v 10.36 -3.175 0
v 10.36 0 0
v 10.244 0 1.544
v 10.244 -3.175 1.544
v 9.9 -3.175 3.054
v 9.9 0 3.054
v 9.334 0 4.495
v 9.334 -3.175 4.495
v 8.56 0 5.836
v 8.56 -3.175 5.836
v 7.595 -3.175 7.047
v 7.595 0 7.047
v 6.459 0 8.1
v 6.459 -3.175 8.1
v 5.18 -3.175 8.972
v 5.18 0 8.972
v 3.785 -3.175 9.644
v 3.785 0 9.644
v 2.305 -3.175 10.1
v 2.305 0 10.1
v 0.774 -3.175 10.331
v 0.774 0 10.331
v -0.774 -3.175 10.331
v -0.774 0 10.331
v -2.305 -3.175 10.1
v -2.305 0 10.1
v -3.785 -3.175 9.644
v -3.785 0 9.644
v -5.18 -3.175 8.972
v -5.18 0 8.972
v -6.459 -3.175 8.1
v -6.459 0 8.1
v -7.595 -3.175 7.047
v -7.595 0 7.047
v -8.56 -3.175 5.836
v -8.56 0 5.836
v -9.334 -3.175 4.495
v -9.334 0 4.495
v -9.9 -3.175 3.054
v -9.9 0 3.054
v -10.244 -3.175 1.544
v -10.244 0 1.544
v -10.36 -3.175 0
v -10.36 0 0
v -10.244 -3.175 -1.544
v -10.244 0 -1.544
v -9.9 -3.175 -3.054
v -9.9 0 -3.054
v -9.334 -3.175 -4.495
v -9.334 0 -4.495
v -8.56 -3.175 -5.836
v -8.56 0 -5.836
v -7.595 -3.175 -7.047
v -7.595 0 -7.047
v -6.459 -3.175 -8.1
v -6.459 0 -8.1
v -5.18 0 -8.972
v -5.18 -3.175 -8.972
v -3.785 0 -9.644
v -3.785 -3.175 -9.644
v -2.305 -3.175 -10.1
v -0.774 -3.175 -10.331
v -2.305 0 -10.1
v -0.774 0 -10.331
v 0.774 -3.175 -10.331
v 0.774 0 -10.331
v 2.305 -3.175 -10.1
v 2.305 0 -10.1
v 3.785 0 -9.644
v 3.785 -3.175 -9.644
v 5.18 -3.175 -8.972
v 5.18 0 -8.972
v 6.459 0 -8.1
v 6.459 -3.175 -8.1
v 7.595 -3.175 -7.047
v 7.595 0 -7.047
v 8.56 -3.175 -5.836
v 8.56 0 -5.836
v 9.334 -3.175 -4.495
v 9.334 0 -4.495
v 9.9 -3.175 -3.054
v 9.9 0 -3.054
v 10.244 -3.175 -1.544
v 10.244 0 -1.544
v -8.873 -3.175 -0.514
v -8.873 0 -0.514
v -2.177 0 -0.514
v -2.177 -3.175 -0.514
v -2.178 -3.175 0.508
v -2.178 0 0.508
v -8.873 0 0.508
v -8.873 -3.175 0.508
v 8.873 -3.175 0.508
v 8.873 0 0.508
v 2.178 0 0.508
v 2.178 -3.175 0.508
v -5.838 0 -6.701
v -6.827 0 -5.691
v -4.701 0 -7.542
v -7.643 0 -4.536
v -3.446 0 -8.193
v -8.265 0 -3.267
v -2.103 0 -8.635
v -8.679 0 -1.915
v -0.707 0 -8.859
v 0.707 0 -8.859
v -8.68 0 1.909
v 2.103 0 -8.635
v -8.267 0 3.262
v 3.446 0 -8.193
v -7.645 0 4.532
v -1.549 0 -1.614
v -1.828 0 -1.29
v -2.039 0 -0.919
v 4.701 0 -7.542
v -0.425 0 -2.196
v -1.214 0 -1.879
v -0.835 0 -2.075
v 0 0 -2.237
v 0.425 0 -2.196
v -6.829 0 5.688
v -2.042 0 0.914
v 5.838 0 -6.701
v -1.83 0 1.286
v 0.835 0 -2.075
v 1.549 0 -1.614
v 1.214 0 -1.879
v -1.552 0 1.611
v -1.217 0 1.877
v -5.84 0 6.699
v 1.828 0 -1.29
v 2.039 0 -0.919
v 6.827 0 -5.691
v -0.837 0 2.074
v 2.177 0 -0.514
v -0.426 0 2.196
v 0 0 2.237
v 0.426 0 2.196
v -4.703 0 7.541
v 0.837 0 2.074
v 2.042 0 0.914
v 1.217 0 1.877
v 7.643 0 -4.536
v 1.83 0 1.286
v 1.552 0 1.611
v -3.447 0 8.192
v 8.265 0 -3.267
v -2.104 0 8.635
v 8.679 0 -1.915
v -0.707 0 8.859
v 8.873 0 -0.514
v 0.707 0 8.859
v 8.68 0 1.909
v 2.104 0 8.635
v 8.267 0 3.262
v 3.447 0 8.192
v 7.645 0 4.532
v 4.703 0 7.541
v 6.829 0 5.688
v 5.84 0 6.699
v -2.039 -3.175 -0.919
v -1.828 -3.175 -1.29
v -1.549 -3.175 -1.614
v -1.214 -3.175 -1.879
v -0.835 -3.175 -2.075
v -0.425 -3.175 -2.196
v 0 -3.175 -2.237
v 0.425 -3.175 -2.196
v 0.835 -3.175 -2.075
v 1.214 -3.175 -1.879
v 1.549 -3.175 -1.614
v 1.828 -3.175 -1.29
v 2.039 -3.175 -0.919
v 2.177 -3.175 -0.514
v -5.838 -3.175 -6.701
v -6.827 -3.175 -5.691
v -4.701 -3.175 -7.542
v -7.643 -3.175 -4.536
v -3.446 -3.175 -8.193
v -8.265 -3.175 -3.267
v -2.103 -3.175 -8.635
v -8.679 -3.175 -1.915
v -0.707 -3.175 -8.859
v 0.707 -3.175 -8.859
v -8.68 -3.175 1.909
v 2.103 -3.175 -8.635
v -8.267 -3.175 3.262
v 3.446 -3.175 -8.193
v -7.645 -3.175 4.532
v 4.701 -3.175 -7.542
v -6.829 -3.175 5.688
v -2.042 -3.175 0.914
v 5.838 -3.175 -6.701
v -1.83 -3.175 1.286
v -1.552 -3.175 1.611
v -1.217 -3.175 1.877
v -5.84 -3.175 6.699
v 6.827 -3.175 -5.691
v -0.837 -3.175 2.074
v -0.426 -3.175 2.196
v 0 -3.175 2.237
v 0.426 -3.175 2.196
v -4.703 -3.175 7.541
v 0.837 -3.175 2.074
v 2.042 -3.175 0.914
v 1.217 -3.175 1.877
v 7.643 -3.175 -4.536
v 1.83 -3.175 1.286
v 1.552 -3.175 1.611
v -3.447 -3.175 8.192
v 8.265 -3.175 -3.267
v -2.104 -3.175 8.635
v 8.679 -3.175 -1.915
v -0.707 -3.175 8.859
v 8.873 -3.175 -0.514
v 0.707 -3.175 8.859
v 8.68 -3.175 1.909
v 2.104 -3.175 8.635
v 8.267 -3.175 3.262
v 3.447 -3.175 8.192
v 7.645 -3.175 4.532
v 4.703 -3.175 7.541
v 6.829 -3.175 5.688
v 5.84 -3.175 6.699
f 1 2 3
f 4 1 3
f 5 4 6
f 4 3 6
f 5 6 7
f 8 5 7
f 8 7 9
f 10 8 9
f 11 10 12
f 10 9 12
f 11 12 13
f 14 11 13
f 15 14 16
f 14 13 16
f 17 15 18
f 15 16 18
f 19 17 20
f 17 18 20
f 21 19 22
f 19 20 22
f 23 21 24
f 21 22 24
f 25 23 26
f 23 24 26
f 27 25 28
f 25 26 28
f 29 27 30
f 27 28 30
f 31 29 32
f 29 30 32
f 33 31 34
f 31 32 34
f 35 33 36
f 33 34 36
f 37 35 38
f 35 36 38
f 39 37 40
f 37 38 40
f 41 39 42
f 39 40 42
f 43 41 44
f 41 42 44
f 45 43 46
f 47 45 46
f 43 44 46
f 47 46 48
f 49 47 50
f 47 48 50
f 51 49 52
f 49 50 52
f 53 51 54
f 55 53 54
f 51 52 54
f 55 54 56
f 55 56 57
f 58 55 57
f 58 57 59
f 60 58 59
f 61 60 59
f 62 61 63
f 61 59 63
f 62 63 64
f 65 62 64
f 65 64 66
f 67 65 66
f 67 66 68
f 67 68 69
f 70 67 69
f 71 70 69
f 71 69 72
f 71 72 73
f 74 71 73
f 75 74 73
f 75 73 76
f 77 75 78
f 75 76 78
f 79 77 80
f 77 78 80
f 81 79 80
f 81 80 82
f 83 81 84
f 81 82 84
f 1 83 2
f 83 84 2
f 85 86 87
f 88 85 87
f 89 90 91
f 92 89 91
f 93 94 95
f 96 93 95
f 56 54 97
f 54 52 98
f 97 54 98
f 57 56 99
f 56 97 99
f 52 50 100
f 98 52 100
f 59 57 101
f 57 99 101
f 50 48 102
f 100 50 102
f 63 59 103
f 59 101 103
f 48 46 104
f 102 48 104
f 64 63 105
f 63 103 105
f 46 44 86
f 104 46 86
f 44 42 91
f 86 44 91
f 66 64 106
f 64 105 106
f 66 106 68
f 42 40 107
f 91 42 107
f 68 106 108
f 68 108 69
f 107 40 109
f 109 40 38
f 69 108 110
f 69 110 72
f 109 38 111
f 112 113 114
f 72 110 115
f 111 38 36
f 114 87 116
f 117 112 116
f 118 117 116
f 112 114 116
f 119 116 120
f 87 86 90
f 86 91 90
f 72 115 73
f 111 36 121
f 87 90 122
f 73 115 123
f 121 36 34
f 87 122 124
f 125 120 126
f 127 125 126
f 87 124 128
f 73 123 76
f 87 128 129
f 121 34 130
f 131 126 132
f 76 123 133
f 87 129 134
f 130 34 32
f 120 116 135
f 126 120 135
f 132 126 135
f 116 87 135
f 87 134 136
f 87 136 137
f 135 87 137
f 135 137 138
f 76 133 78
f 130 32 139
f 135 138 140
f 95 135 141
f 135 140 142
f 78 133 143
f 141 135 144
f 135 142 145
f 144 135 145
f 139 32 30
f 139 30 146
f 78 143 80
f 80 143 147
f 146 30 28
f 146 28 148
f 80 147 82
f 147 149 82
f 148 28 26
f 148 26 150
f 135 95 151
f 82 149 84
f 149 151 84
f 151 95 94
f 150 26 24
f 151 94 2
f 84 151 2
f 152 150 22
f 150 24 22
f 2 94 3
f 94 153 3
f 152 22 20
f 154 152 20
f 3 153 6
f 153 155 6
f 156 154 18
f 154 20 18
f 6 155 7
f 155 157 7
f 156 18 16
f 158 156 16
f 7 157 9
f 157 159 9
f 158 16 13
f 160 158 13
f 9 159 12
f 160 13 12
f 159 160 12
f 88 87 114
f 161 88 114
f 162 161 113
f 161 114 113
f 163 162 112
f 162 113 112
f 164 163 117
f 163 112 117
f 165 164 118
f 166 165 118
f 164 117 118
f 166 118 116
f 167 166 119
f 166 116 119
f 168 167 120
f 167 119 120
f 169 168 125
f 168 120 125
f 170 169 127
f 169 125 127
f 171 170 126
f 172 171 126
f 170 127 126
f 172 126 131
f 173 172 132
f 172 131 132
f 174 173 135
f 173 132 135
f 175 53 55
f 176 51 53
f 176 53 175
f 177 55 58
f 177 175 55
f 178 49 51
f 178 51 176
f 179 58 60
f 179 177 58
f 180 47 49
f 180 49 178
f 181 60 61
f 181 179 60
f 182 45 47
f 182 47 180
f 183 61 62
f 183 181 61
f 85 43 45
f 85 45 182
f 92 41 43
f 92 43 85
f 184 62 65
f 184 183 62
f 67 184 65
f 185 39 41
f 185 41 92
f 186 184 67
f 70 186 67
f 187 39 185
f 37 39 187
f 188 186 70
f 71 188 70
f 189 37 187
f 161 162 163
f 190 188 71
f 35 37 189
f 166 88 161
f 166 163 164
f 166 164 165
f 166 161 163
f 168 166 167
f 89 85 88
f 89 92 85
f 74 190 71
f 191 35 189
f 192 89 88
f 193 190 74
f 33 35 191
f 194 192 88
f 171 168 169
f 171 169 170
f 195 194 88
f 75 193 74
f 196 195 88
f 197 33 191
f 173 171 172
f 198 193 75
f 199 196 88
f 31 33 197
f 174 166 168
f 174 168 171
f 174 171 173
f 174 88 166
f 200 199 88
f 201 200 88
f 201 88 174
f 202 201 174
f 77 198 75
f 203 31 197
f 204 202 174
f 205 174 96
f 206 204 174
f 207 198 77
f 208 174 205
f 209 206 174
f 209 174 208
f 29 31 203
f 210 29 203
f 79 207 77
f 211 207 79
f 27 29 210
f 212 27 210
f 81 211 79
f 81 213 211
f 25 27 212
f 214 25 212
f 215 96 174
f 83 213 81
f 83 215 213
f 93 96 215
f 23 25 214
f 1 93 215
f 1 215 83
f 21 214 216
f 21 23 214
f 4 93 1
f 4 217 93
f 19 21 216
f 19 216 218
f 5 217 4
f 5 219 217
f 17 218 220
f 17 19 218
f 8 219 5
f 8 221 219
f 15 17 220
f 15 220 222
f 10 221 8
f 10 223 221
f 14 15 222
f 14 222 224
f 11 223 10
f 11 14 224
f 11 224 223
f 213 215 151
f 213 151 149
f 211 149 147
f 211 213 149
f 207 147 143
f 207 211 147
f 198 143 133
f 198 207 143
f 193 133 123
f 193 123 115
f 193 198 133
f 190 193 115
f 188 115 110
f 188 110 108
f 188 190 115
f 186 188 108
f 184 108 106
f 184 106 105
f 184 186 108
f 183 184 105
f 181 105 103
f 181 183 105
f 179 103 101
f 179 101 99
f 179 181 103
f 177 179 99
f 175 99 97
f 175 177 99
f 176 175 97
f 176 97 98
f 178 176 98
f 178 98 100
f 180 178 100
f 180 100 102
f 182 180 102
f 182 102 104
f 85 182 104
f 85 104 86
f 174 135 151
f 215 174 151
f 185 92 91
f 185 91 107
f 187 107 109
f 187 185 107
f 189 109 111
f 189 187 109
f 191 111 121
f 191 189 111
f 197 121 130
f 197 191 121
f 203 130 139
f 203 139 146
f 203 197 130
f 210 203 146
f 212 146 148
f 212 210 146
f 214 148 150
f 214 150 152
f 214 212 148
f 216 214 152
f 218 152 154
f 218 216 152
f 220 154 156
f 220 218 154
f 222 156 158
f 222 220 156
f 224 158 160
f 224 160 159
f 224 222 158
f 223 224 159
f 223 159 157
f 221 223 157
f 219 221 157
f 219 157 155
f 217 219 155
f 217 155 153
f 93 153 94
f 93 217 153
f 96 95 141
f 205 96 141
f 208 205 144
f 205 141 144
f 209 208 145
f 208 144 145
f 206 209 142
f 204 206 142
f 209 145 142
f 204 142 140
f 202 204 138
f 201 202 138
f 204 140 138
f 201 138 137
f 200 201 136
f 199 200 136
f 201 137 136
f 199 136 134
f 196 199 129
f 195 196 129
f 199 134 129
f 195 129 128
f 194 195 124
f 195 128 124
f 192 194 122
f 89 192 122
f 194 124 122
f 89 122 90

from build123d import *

# Parameters (mm, degrees)
F0_R     = 10.3601879012
F1_DEPTH = 3.175
F2_R     = 10.3601879012
F3_DEPTH = 3.175


with BuildPart() as f1:
    # F0 (on Front) → F1 (new body)
    with BuildSketch(Plane.XZ):
        Circle(F0_R)
        with BuildLine():
            ThreePointArc((9.5114533333, 0.5078193457), (9.521612731, 0.254), (9.525, 0))
            ThreePointArc((9.525, 0), (9.5215246826, -0.2572794566), (9.5111012664, -0.5143711699))
            ThreePointArc((9.5111012664, -0.5143711699), (0, -9.525), (-9.5111012664, -0.5143711699))
            ThreePointArc((-9.5111012664, -0.5143711699), (-9.524999435, -0.0032806383), (-9.5114533333, 0.5078193457))
            ThreePointArc((-9.5114533333, 0.5078193457), (0, 9.525), (9.5114533333, 0.5078193457))
        make_face(mode=Mode.SUBTRACT)
        with BuildLine():
            Line((-2.1784585047, 0.5078193457), (-9.5114533333, 0.5078193457))
            ThreePointArc((-9.5114533333, 0.5078193457), (-9.524999435, -0.0032806383), (-9.5111012664, -0.5143711699))
            Line((-9.5111012664, -0.5143711699), (-2.1769208171, -0.5143711699))
            ThreePointArc((-2.1769208171, -0.5143711699), (-2.2368617797, -0.0033649251), (-2.1784585047, 0.5078193457))
        make_face()
        with BuildLine():
            ThreePointArc((2.2368643107, 0), (2.222214889, 0.2555835118), (2.1784585047, 0.5078193457))
            ThreePointArc((2.1784585047, 0.5078193457), (0, 2.2368643107), (-2.1784585047, 0.5078193457))
            ThreePointArc((-2.1784585047, 0.5078193457), (-2.2368617797, -0.0033649251), (-2.1769208171, -0.5143711699))
            ThreePointArc((-2.1769208171, -0.5143711699), (0, -2.2368643107), (2.1769208171, -0.5143711699))
            ThreePointArc((2.1769208171, -0.5143711699), (2.2218278992, -0.2589261105), (2.2368643107, 0))
        make_face()
        with BuildLine():
            ThreePointArc((9.5111012664, -0.5143711699), (9.5215246826, -0.2572794566), (9.525, 0))
            ThreePointArc((9.525, 0), (9.521612731, 0.254), (9.5114533333, 0.5078193457))
            Line((9.5114533333, 0.5078193457), (2.1784585047, 0.5078193457))
            ThreePointArc((2.1784585047, 0.5078193457), (2.222214889, 0.2555835118), (2.2368643107, 0))
            ThreePointArc((2.2368643107, 0), (2.2218278992, -0.2589261105), (2.1769208171, -0.5143711699))
            Line((2.1769208171, -0.5143711699), (9.5111012664, -0.5143711699))
        make_face()
    extrude(amount=F1_DEPTH)

    # F2 (on face) → F3 (join)
    with BuildSketch(Plane.XZ.offset(3.175)):
        Circle(F2_R)
        with BuildLine():
            ThreePointArc((8.8731253784, 0.5078193457), (8.8840143878, 0.2540134389), (8.8876450463, 0))
            ThreePointArc((8.8876450463, 0), (8.8839199998, -0.2572934234), (8.872747983, -0.5143711699))
            Line((8.872747983, -0.5143711699), (9.5111012664, -0.5143711699))
            ThreePointArc((9.5111012664, -0.5143711699), (0, -9.525), (-9.5111012664, -0.5143711699))
            Line((-9.5111012664, -0.5143711699), (-8.872747983, -0.5143711699))
            ThreePointArc((-8.872747983, -0.5143711699), (-8.8876444406, -0.0032813423), (-8.8731253784, 0.5078193457))
            Line((-8.8731253784, 0.5078193457), (-9.5114533333, 0.5078193457))
            ThreePointArc((-9.5114533333, 0.5078193457), (0, 9.525), (9.5114533333, 0.5078193457))
            Line((9.5114533333, 0.5078193457), (8.8731253784, 0.5078193457))
        make_face(mode=Mode.SUBTRACT)
        with BuildLine():
            ThreePointArc((-8.8731253784, 0.5078193457), (0, 8.8876450463), (8.8731253784, 0.5078193457))
            Line((8.8731253784, 0.5078193457), (9.5114533333, 0.5078193457))
            ThreePointArc((9.5114533333, 0.5078193457), (0, 9.525), (-9.5114533333, 0.5078193457))
            Line((-9.5114533333, 0.5078193457), (-8.8731253784, 0.5078193457))
        make_face()
        with BuildLine():
            Line((9.5111012664, -0.5143711699), (8.872747983, -0.5143711699))
            ThreePointArc((8.872747983, -0.5143711699), (0, -8.8876450463), (-8.872747983, -0.5143711699))
            Line((-8.872747983, -0.5143711699), (-9.5111012664, -0.5143711699))
            ThreePointArc((-9.5111012664, -0.5143711699), (0, -9.525), (9.5111012664, -0.5143711699))
        make_face()
    extrude(amount=-F3_DEPTH)


solid = f1.part
